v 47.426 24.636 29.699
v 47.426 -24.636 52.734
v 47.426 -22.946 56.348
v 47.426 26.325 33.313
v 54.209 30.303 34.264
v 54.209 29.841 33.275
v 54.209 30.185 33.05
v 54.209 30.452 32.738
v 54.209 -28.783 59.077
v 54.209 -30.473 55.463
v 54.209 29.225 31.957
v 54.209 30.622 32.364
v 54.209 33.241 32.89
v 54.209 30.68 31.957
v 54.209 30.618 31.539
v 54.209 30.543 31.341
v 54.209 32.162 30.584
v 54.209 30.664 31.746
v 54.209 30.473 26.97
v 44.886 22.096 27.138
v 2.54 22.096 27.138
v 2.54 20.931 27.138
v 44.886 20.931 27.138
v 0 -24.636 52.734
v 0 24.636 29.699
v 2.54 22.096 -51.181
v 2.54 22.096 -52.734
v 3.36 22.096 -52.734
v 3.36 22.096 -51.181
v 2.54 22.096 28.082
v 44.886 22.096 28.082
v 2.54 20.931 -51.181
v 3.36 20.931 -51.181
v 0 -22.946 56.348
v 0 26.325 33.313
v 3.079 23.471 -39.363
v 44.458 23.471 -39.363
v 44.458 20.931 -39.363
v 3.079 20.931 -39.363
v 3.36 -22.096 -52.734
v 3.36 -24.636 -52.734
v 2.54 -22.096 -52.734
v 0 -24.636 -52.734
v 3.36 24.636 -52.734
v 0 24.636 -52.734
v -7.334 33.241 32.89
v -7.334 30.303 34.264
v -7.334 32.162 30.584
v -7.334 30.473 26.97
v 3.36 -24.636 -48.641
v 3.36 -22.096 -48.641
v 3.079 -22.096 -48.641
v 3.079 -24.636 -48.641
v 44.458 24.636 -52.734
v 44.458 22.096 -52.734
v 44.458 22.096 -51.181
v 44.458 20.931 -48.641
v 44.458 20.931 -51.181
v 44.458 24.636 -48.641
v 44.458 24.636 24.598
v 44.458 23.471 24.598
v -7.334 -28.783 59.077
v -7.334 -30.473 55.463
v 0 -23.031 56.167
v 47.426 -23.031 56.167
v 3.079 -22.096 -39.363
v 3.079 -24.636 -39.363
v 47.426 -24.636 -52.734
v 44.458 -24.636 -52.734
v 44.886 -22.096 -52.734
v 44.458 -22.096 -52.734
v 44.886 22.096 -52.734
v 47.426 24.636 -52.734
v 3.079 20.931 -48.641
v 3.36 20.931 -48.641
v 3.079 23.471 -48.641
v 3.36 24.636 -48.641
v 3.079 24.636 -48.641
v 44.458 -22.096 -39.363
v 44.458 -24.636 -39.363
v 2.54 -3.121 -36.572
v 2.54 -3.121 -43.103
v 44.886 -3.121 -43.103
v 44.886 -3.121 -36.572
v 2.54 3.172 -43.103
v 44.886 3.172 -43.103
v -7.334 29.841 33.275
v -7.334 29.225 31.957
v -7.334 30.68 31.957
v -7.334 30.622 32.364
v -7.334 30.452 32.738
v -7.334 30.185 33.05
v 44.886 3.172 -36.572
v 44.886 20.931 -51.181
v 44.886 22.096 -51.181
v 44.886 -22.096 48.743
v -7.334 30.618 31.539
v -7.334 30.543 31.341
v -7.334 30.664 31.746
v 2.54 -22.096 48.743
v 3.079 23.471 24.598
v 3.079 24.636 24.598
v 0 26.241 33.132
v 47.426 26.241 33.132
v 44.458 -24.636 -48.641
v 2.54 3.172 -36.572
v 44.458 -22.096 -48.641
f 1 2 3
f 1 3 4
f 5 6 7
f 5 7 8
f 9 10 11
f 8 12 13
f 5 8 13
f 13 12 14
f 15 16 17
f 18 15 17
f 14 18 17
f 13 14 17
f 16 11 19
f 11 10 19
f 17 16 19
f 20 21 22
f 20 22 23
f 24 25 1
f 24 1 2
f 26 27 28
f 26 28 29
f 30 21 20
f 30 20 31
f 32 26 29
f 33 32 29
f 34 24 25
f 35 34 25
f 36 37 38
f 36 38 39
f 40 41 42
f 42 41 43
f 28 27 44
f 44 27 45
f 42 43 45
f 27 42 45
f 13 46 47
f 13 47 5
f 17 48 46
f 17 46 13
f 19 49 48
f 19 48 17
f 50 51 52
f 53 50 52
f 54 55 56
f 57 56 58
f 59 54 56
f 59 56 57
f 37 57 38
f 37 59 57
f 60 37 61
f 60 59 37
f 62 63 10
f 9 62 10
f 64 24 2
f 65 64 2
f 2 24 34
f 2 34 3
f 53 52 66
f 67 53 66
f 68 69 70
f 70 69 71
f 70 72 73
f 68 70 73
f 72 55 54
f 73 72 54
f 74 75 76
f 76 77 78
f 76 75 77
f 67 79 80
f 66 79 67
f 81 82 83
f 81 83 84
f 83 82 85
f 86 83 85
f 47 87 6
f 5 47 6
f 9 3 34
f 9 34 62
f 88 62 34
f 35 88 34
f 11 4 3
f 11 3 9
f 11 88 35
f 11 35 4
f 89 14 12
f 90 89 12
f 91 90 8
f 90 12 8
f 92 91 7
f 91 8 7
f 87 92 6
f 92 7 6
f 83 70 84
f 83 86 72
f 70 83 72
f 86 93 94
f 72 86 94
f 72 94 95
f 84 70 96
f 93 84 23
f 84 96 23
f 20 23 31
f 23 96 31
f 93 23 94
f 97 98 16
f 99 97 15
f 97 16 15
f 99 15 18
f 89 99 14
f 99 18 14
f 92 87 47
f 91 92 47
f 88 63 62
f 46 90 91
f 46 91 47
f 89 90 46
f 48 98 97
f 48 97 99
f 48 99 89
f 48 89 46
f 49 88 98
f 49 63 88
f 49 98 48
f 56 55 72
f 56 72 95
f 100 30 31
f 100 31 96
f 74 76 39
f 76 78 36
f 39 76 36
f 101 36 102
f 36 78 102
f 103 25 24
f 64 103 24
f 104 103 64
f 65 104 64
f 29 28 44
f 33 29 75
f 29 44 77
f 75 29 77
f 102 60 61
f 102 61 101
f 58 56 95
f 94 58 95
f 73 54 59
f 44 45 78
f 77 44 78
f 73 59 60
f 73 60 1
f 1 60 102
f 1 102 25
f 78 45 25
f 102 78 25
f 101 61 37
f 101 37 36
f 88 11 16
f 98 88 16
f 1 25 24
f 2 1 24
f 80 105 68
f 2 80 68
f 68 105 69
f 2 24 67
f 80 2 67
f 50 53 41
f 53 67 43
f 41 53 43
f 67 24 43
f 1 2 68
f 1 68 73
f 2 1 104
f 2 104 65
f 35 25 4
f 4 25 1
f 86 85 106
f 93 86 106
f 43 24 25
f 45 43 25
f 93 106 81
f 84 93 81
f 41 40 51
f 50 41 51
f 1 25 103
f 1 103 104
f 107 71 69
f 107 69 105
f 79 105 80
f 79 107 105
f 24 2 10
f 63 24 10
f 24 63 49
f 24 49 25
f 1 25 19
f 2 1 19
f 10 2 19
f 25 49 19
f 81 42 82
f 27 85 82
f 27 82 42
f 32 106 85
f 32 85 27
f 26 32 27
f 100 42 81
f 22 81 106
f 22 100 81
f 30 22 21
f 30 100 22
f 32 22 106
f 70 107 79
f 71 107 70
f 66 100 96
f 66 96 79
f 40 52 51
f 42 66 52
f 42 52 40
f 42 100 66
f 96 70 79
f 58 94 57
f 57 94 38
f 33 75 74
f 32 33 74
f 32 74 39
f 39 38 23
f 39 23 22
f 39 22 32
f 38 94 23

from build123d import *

# Parameters (mm, degrees)
F1_DEPTH    = 47.4263094366
F2_W        = 61.5427512676
F2_H        = 67.2771147457
F2_W_2      = 47.4263094366
F2_H_2      = 54.3905875297
F3_DEPTH    = 3.989492543
F4_DEPTH    = 3.7897219881
F5_W        = 61.5427512676
F5_H        = 3.2427412463
F6_DEPTH    = 2.5458927266
F7_W        = 41.3791541941
F7_H        = 73.2382405549
F8_DEPTH    = 1.1647148058
F9_T        = 2.54
F9_T3_DEPTH = 6.2447148058
F9_T5_DEPTH = 78.3182405549
F9_T7_DEPTH = 46.4591541941
F10_W       = 41.3791541941
F10_H       = 9.277254343
F11_DEPTH   = 51.4699444175
F12_W       = 41.0984121263
F12_H       = 4.0935091674
F13_DEPTH   = 56.4465969801
F14_W       = 3.1205418054
F14_H       = 6.5310224891
F14_W_2     = 3.1721270643
F15_DEPTH   = 43.8657402992
F16_W       = 39.7140569985
F16_H       = 81.2445171177
F17_DEPTH   = 10
F19_DEPTH   = 80.7498022914


# Not quite as in the source:
# - a shell that OpenCascade refuses in one call is made with other operations: the cavity is built on its own and cut out


with BuildPart() as f1:
    # F0 (on Right) → F1 (new body)
    with BuildSketch(Plane.YZ):
        Polygon((24.6358662844, 29.6986699104), (-24.6358662844, 52.7341291308), (-24.6358662844, -52.7341291308), (24.6358662844, -52.7341291308), align=None)
    extrude(amount=F1_DEPTH)


with BuildPart() as f3:
    # F2 (on face) → F3 (new body)
    with BuildSketch(Plane(origin=(0, 15.8131088069, 33.8234745294), x_dir=(1, 0, 0), z_dir=(0, 0.4235192203, 0.9058871177))):
        with Locations((23.4371926636, -17.4559373872)):
            Rectangle(F2_W, F2_H)
        with Locations((23.7131547183, -17.4559373872)):
            Rectangle(F2_W_2, F2_H_2, mode=Mode.SUBTRACT)
    extrude(amount=F3_DEPTH)

    # F5 (on face) → F6 (join)
    with BuildSketch(Plane(origin=(0, 17.502735578, 37.4375044304), x_dir=(1, 0, 0), z_dir=(0, 0.4235192203, 0.9058871177))):
        with Locations((23.4371926636, 14.5612493625)):
            Rectangle(F5_W, F5_H)
    extrude(amount=F6_DEPTH)

    # F18 (on face) → F19 (cut)
    with BuildSketch(Plane.YZ.offset(54.2085682973)):
        with BuildLine():
            Line((29.224805033, 31.9572170763), (30.5427146714, 31.3410695989))
            ThreePointArc((30.5427146714, 31.3410695989), (30.6449907476, 31.6416286341), (30.6796326959, 31.9572170763))
            ThreePointArc((30.6796326959, 31.9572170763), (30.4521827099, 32.7382852981), (29.8409525104, 33.2751267147))
            Line((29.8409525104, 33.2751267147), (29.224805033, 31.9572170763))
        make_face()
    extrude(amount=-F19_DEPTH, mode=Mode.SUBTRACT)


with BuildPart() as f4:
    # F4 (new): a face of the model
    f4_faces = [f1.part.faces().sort_by_distance(p)[0] for p in [
        (23.7131547183, 0, 41.2163995206),
    ]]
    extrude(f4_faces, amount=F4_DEPTH)


with BuildPart() as f1_1:
    add(f1.part)

    # F7 (on face) → F8 (cut)
    with BuildSketch(Plane(origin=(0, 24.6358662844, 0), x_dir=(-1, 0, 0), z_dir=(0, 1, 0))):
        with Locations((-23.7684322055, -12.0214996859)):
            Rectangle(F7_W, F7_H)
    extrude(amount=-F8_DEPTH, mode=Mode.SUBTRACT)

    # F9: shell of thickness 2.54, made by hand


with BuildPart() as f9_core1:
    # F9_t2: copy of F1
    add(f1_1.part)

    # the walls: a layer under each face that stays
    f9_faces = [f9_core1.faces().sort_by_distance(p)[0] for p in [
        (23.7131547183, 0, 41.2163995206),
        (45.8454324553, 24.6358662844, -49.9863691628),
        (23.7131547183, -24.6358662844, 0),
        (0, 0, 0),
        (47.4263094366, 0, 0),
        (3.0788551085, 24.0535088815, -12.0214996859),
        (23.7684322055, 24.0535088815, -48.6406199634),
        (44.4580093026, 24.0535088815, -12.0214996859),
        (23.7684322055, 24.0535088815, 24.5976205915),
        (23.7684322055, 23.4711514786, -12.0214996859),
    ]]
    thicken(f9_faces, amount=-F9_T, mode=Mode.SUBTRACT)

    # F9_s4 → F9_t3 (cut)
    with BuildSketch(Plane.XZ.offset(-27.1758662844)):
        Polygon((3.1042551085, -48.6152199634), (0.5388551085, -48.6406199634), (0.5388551085, -51.1806199634), (3.0788551085, -51.1806199634), align=None)
        Polygon((3.1042551085, 24.5722205915), (0.5388551085, 24.5976205915), (0.5388551085, 27.1376205915), (3.0788551085, 27.1376205915), align=None)
        Polygon((44.4326093026, -48.6152199634), (44.4580093026, -51.1806199634), (46.9980093026, -51.1806199634), (46.9980093026, -48.6406199634), align=None)
        Polygon((44.4326093026, 24.5722205915), (46.9980093026, 24.5976205915), (46.9980093026, 27.1376205915), (44.4580093026, 27.1376205915), align=None)
    extrude(amount=F9_T3_DEPTH, mode=Mode.SUBTRACT)

    # F9_s6 → F9_t5 (cut)
    with BuildSketch(Plane.XY.offset(-51.1806199634)):
        Polygon((3.1042551085, 23.4965514786), (0.5388551085, 23.4711514786), (0.5388551085, 20.9311514786), (3.0788551085, 20.9311514786), align=None)
        Polygon((44.4326093026, 23.4965514786), (46.9980093026, 23.4711514786), (46.9980093026, 20.9311514786), (44.4580093026, 20.9311514786), align=None)
    extrude(amount=F9_T5_DEPTH, mode=Mode.SUBTRACT)

    # F9_s8 → F9_t7 (cut)
    with BuildSketch(Plane.YZ.offset(0.5388551085)):
        Polygon((23.4965514786, -48.6152199634), (23.4711514786, -51.1806199634), (20.9311514786, -51.1806199634), (20.9311514786, -48.6406199634), align=None)
        Polygon((23.4965514786, 24.5722205915), (23.4711514786, 27.1376205915), (20.9311514786, 27.1376205915), (20.9311514786, 24.5976205915), align=None)
    extrude(amount=F9_T7_DEPTH, mode=Mode.SUBTRACT)


with BuildPart() as f1_2:
    add(f1_1.part)

    # what is left inside the walls is the cavity
    f9_cavity = [f9_core1.part.solids().sort_by_distance(p)[0] for p in [
        (30.770873, -22.070466, -1.99569),
    ]]
    add(f9_cavity, mode=Mode.SUBTRACT)

    # F10 (on face) → F11 (cut)
    with BuildSketch(Plane(origin=(0, 23.4711514786, 0), x_dir=(-1, 0, 0), z_dir=(0, 1, 0))):
        with Locations((-23.7684322055, -44.0019927919)):
            Rectangle(F10_W, F10_H)
    extrude(amount=-F11_DEPTH, mode=Mode.SUBTRACT)

    # F12 (on face) → F13 (cut)
    with BuildSketch(Plane(origin=(0, 24.6358662844, 0), x_dir=(-1, 0, 0), z_dir=(0, 1, 0))):
        with Locations((-23.9088032395, -50.6873745471)):
            Rectangle(F12_W, F12_H)
    extrude(amount=-F13_DEPTH, mode=Mode.SUBTRACT)

    # F14 (on face) → F15 (join)
    with BuildSketch(Plane.YZ.offset(2.54)):
        with Locations((-1.5602709027, -39.8372523487)):
            Rectangle(F14_W, F14_H)
        with Locations((1.5860635322, -39.8372523487)):
            Rectangle(F14_W_2, F14_H)
    extrude(amount=F15_DEPTH)

    # F16 (on face) → F17 (cut)
    with BuildSketch(Plane.XZ.offset(24.6358662844)):
        with Locations((22.683288902, 4.934841767)):
            Rectangle(F16_W, F16_H)
    extrude(amount=F17_DEPTH, mode=Mode.SUBTRACT)


solid = Compound([f3.part, f4.part, f1_2.part])
